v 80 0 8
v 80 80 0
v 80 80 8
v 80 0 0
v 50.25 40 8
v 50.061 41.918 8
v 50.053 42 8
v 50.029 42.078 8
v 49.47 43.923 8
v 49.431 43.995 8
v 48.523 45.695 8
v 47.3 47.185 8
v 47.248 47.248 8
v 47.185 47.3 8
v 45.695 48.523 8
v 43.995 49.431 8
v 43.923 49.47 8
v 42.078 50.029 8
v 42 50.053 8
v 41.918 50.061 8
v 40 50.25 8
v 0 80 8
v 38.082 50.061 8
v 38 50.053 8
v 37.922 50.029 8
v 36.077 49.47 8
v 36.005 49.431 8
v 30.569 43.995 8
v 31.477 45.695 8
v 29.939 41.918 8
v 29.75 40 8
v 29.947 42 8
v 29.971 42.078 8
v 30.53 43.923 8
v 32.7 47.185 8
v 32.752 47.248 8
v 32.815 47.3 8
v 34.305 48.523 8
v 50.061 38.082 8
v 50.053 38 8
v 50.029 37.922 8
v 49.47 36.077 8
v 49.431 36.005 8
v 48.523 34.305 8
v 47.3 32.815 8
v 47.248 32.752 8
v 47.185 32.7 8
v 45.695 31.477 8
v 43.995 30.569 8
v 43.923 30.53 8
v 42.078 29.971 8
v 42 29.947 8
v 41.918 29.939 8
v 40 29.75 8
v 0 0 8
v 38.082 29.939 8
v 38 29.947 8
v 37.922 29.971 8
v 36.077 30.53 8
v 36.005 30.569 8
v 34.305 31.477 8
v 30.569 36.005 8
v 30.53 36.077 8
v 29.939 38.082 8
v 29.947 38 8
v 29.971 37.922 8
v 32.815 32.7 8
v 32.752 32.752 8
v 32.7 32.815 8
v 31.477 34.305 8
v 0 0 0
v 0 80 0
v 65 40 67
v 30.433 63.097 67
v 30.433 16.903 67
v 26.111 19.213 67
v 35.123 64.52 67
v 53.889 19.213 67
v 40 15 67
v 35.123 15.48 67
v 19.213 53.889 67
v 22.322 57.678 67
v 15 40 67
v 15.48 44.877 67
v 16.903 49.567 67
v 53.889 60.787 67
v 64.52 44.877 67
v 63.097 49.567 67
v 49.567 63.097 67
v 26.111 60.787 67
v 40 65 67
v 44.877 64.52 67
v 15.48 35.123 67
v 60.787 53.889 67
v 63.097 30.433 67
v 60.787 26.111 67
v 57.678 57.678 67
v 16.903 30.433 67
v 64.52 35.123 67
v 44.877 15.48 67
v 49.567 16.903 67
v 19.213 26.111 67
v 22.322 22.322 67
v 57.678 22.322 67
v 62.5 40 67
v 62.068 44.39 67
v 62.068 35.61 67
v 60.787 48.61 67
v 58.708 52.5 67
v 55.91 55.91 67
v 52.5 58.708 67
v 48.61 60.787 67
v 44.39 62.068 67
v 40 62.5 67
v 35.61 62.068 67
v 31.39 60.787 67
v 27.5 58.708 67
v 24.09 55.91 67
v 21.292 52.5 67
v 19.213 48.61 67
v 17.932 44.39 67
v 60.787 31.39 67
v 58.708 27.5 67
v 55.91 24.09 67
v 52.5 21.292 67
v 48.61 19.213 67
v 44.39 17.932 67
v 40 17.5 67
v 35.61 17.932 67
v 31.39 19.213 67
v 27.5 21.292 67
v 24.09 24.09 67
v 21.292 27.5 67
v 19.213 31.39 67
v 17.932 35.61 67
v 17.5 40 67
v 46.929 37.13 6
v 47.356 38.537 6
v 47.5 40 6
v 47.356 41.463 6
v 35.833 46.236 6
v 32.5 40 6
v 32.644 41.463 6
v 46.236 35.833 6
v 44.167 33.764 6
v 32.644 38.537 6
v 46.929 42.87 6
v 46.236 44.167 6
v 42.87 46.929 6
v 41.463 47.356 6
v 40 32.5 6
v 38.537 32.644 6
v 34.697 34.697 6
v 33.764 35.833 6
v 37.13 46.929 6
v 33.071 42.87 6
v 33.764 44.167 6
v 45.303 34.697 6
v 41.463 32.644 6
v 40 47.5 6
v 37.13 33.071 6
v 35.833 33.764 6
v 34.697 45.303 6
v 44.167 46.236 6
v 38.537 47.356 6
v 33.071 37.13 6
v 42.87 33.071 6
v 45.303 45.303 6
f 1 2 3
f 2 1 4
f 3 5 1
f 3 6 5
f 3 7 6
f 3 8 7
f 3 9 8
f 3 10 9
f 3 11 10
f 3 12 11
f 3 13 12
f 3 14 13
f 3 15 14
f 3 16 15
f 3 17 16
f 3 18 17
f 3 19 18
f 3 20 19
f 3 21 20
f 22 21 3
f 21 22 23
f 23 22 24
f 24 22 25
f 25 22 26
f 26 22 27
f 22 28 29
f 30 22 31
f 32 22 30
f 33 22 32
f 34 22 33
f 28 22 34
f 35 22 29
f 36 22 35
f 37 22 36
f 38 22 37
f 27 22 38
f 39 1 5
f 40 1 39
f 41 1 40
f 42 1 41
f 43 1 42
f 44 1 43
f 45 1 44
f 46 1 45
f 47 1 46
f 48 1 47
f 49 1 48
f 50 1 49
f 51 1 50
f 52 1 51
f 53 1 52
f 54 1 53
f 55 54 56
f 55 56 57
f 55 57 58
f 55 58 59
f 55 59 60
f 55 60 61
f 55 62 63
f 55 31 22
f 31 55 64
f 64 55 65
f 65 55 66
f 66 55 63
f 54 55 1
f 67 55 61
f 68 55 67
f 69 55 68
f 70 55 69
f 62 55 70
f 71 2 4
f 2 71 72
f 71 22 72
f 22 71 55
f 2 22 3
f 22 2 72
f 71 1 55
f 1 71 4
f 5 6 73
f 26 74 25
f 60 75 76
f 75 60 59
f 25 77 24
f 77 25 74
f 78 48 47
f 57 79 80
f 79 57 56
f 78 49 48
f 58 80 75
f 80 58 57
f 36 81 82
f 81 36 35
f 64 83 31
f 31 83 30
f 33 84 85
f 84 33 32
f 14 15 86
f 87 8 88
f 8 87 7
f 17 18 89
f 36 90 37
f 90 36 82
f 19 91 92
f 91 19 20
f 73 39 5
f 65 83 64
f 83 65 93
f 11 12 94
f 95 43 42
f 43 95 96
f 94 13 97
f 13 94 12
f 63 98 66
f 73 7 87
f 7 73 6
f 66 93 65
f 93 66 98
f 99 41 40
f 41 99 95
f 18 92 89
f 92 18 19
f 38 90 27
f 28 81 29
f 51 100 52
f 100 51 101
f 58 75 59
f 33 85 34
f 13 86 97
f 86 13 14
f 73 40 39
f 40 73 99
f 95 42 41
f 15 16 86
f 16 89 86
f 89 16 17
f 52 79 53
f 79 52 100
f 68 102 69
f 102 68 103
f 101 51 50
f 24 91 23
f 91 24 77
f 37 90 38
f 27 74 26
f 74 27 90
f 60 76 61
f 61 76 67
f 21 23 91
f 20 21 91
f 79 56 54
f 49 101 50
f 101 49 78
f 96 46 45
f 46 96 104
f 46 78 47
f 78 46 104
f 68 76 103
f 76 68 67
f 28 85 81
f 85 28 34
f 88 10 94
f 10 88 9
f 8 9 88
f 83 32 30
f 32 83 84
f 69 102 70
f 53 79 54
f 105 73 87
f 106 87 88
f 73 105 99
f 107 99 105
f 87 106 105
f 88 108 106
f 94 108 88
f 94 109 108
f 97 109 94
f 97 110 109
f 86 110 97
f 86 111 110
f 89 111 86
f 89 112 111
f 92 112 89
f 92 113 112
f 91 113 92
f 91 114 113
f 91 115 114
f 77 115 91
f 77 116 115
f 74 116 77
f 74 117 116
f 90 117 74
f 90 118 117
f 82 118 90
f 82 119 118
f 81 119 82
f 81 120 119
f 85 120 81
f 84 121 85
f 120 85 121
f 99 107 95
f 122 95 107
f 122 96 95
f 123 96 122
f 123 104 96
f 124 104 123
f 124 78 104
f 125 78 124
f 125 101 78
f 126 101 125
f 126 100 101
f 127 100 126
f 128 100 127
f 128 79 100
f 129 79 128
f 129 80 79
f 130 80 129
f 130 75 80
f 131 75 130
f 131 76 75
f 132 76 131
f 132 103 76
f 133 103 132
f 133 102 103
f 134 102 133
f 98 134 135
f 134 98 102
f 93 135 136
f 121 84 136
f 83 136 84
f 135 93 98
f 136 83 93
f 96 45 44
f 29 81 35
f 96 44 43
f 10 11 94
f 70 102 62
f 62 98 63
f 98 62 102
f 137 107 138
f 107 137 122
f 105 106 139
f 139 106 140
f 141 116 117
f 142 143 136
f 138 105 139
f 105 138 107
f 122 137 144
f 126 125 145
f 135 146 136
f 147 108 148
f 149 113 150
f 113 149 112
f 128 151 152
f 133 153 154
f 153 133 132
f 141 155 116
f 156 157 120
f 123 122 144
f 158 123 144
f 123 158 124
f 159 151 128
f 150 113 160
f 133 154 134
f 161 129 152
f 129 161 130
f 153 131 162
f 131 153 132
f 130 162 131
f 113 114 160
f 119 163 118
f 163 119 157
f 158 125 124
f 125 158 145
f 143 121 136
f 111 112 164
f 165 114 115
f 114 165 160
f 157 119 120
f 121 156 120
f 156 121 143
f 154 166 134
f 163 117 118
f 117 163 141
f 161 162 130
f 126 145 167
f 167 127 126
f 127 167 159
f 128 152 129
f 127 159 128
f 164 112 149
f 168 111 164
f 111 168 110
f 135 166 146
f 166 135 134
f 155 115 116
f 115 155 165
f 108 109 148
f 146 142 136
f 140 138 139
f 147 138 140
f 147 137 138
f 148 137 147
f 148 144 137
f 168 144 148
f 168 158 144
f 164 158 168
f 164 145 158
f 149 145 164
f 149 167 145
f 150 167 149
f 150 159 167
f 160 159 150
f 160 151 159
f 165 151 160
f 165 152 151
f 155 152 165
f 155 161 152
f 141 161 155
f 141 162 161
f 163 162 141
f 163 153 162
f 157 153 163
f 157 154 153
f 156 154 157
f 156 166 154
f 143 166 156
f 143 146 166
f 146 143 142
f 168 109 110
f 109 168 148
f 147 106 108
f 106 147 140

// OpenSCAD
$fn = 32;

// ----------------------------------------------------------------------
// Hopper: funnel with square flange
// ----------------------------------------------------------------------

// --- parameters (mm) ---
fl = 80;                  // flange side, X and Y
fl_t = 8;                 // flange thickness
cone_h = 60;              // cone height above the flange
top_d = 50;               // cone mouth diameter
bot_d = 20;               // cone spout diameter
wall = 2.5;               // cone wall thickness

bore_d = bot_d - 2 * wall;  // spout bore diameter
total_h = fl_t + cone_h - 1;  // overall height

difference() {
  union() {
    cube([fl, fl, fl_t]);
    translate([fl / 2, fl / 2, fl_t - 1])
      cylinder(h = cone_h, d1 = bot_d, d2 = top_d);
  }
  translate([fl / 2, fl / 2, fl_t - 2])
    cylinder(h = cone_h + 1, d1 = bore_d, d2 = top_d - 2 * wall);
}
